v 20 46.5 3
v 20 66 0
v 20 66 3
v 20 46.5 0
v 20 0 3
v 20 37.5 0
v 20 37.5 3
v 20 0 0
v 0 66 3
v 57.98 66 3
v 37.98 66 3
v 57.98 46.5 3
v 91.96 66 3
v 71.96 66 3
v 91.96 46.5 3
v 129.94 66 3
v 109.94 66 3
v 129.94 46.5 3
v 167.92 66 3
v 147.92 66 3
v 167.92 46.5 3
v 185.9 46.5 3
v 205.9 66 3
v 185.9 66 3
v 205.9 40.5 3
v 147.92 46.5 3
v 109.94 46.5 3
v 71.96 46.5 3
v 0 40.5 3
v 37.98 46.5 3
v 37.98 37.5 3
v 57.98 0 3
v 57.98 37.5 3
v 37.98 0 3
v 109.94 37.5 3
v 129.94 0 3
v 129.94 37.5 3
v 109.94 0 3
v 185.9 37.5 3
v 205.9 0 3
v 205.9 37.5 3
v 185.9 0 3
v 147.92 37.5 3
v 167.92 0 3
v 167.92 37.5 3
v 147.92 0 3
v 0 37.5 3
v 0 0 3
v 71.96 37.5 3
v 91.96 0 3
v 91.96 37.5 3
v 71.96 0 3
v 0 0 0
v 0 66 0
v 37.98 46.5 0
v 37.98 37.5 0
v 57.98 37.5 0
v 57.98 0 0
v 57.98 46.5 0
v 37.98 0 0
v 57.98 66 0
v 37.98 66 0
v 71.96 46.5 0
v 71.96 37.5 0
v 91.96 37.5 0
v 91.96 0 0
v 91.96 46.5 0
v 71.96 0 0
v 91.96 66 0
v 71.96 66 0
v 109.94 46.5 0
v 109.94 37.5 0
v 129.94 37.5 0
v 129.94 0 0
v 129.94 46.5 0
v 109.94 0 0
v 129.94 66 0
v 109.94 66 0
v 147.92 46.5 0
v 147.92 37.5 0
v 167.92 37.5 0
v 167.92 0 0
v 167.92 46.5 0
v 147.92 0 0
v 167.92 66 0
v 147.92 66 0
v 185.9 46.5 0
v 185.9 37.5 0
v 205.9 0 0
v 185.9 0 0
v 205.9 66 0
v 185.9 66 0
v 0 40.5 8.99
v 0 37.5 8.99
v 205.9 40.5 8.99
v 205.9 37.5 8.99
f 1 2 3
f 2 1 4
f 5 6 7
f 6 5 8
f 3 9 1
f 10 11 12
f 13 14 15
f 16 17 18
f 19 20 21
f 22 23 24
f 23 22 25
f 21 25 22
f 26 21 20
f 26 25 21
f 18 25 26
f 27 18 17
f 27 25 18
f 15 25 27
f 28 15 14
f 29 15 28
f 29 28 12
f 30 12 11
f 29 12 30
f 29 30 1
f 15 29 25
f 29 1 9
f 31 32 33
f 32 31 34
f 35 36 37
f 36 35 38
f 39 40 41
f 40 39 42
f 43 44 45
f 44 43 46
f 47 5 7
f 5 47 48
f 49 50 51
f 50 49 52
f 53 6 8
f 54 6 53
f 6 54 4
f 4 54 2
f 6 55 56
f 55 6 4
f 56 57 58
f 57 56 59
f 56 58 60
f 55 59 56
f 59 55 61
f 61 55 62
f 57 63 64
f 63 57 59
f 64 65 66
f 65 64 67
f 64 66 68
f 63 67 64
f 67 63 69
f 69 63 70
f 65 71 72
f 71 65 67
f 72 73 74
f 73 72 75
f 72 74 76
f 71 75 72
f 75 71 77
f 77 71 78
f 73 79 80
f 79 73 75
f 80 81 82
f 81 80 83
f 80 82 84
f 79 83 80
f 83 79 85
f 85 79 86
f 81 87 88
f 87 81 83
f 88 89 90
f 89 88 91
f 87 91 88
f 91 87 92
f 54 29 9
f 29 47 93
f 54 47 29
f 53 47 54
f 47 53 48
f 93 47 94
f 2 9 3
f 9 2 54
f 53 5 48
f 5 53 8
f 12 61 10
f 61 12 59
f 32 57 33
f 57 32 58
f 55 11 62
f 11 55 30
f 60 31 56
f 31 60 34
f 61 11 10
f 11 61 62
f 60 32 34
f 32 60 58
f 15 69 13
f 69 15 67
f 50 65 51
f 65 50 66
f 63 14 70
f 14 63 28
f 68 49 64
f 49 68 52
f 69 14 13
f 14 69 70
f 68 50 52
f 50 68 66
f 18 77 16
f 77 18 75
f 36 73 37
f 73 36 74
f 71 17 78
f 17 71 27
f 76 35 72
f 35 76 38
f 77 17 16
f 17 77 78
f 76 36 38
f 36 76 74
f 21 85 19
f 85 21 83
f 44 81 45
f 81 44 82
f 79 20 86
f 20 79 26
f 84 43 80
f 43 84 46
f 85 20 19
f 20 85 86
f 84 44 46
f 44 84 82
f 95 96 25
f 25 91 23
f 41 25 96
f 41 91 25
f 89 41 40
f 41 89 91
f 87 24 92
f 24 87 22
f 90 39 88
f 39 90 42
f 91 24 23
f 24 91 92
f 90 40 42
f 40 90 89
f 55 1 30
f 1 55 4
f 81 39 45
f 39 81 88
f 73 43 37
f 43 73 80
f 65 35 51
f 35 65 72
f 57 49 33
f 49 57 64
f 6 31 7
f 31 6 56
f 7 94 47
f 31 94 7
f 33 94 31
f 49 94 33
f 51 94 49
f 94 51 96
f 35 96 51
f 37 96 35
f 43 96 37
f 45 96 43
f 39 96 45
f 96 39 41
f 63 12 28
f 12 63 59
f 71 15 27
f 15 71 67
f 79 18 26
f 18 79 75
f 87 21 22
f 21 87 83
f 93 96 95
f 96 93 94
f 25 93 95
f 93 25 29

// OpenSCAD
// file: ../lib/block_bridge_chain_with_top_lib.scad
// scad/lib/block_bridge_chain_with_top_lib.scad
// ----------------------------------------------------------------------------
// LIBRARY: Joined blocks with variable-length bridges + optional full-length top
// Units: millimeters (mm)
//
// This library provides the "engine" module that builds the assembly.
// Presets should not call this directly; they should call the part wrapper in
// scad/parts/.
//
// Coordinate system:
// - Origin is the bottom-left-back corner of the FIRST block.
// - +X runs along the chain of blocks.
// - +Y runs "up" within the block footprint in Y.
// - +Z runs upward (thickness/height).
//
// Concepts:
// - Blocks are identical solids placed along +X.
// - Bridges connect block i to block i+1 with per-bridge X-length.
// - A top cap can span the full assembly in X.
// - Bridge Y placement can be min/center/max or numeric Y start.
// ----------------------------------------------------------------------------


// -----------------------------
// Small utilities (pure functions)
// -----------------------------

// Sum of the first n elements of vector v (safe-clamped).
function sum_first(v, n) =
    (n <= 0) ? 0 :
    (n > len(v)) ? sum_first(v, len(v)) :
    v[n-1] + sum_first(v, n-1);

// Clamp scalar v to [lo, hi].
function clamp(v, lo, hi) = (v < lo) ? lo : (v > hi) ? hi : v;

// Convert a "placement spec" into an explicit Y start coordinate.
// Supported:
// - "min"    -> 0
// - "center" -> (container_y - feature_y)/2
// - "max"    -> (container_y - feature_y)
// - number   -> that number (interpreted as a Y start coordinate)
function resolve_y_start(pos, container_y, feature_y) =
    (pos == "min")    ? 0 :
    (pos == "center") ? (container_y - feature_y) / 2 :
    (pos == "max")    ? (container_y - feature_y) :
                        pos;

// X position (origin) of block i (0-based).
// Includes bridge lengths placed before it, and overlap correction.
function block_origin_x(i, block_size_x, bridge_lengths, join_overlap) =
    i * block_size_x
    + sum_first(bridge_lengths, i)
    - (2 * i * join_overlap);

// X position (origin) of bridge j (0-based), between block j and j+1.
function bridge_origin_x(j, block_size_x, bridge_lengths, join_overlap) =
    block_origin_x(j, block_size_x, bridge_lengths, join_overlap) + block_size_x - join_overlap;

// Total X length of the whole assembly.
function assembly_size_x(block_count, block_size_x, bridge_lengths, join_overlap) =
    (block_count * block_size_x)
    + sum_first(bridge_lengths, block_count - 1)
    - (2 * (block_count - 1) * join_overlap);


// -----------------------------
// Primitive solids (modules)
// -----------------------------
module solid_block(size_xyz) {
    cube(size_xyz, center=false);
}

module solid_bridge(len_x, size_y, size_z) {
    cube([len_x, size_y, size_z], center=false);
}


// ----------------------------------------------------------------------------
// Main builder module (engine)
//
// Parameters map closely to your original script.
// ----------------------------------------------------------------------------
module block_bridge_chain_with_top(
    block_count,
    block_size_xyz,          // [X, Y, Z] for each block
    bridge_size_y,           // thickness of bridge in Y
    bridge_size_z,           // thickness of bridge in Z
    bridge_lengths,          // array length = block_count-1
    bridge_y_pos,            // "min" | "center" | "max" | number (Y start)
    join_overlap=0.01,
    add_top_block=false,
    top_size_y=1,            // thickness of top in Y
    top_size_z=1,            // height of top in Z
    clamp_top_y_to_block=true
) {

    // -----------------------------
    // Safety checks (fail early)
    // -----------------------------
    assert(block_count >= 1, "block_count must be >= 1");
    assert(len(bridge_lengths) == max(block_count - 1, 0),
        "bridge_lengths must have exactly block_count-1 entries");

    assert(bridge_size_y > 0, "bridge_size_y must be > 0");
    assert(bridge_size_y <= block_size_xyz[1], "bridge_size_y must be <= block_size_xyz[1]");
    assert(bridge_size_z > 0, "bridge_size_z must be > 0");

    assert(top_size_y > 0, "top_size_y must be > 0");
    assert(top_size_z > 0, "top_size_z must be > 0");

    // -----------------------------
    // Derived values
    // -----------------------------
    block_size_x = block_size_xyz[0];
    block_size_y = block_size_xyz[1];
    block_size_z = block_size_xyz[2];

    // Resolve + clamp bridge Y start so it stays fully inside the block footprint.
    _raw_bridge_y = resolve_y_start(bridge_y_pos, block_size_y, bridge_size_y);
    bridge_y_start = clamp(_raw_bridge_y, 0, block_size_y - bridge_size_y);

    // Full X size of assembly
    assembly_x = assembly_size_x(block_count, block_size_x, bridge_lengths, join_overlap);

    // Top sits on the tallest Z among block vs bridge
    base_z = max(block_size_z, bridge_size_z);

    // Top block sizing + placement
    top_size_xyz = [assembly_x, top_size_y, top_size_z];

    // Align top’s Y start to bridge’s Y start (same “lane”)
    _raw_top_y = bridge_y_start;
    _top_y_clamped = clamp(_raw_top_y, 0, block_size_y - top_size_y);
    top_y_start = clamp_top_y_to_block ? _top_y_clamped : _raw_top_y;

    // Top spans the full assembly: X=0; Z sits at base_z, with tiny overlap for union cleanliness
    top_pos = [0, top_y_start, base_z - join_overlap];

    // -----------------------------
    // Build geometry
    // -----------------------------
    union() {
        // Blocks
        for (i = [0 : block_count - 1]) {
            translate([block_origin_x(i, block_size_x, bridge_lengths, join_overlap), 0, 0])
                solid_block(block_size_xyz);
        }

        // Bridges (only if there are 2+ blocks)
        for (j = [0 : block_count - 2]) {
            translate([bridge_origin_x(j, block_size_x, bridge_lengths, join_overlap), bridge_y_start, 0])
                solid_bridge(bridge_lengths[j], bridge_size_y, bridge_size_z);
        }

        // Optional full-length top block
        if (add_top_block) {
            translate(top_pos)
                solid_block(top_size_xyz);
        }
    }
}
// file: ../parts/block_bridge_chain_with_top_ypos.scad
// scad/parts/block_bridge_chain_with_top_ypos.scad
// ----------------------------------------------------------------------------
// PART: Joined blocks with variable-length bridges + optional full-length top,
// with bridge Y placement control.
// Units: mm
//
// Presets should call: block_bridge_chain_with_top_part(...)
//
// This wrapper exists so presets don’t need to know about library internals.
// ----------------------------------------------------------------------------

use <../lib/block_bridge_chain_with_top_lib.scad>;

// Public part module (stable API for presets)
module block_bridge_chain_with_top_part(
    block_count,
    block_size_xyz,
    bridge_size_y,
    bridge_size_z,
    bridge_lengths,
    bridge_y_pos,
    join_overlap=0.01,
    add_top_block=false,
    top_size_y=1,
    top_size_z=1,
    clamp_top_y_to_block=true
) {
    block_bridge_chain_with_top(
        block_count            = block_count,
        block_size_xyz         = block_size_xyz,
        bridge_size_y          = bridge_size_y,
        bridge_size_z          = bridge_size_z,
        bridge_lengths         = bridge_lengths,
        bridge_y_pos           = bridge_y_pos,
        join_overlap           = join_overlap,
        add_top_block          = add_top_block,
        top_size_y             = top_size_y,
        top_size_z             = top_size_z,
        clamp_top_y_to_block   = clamp_top_y_to_block
    );
}
// main file
// scad/presets/block_bridge_chain_with_top_ypos_example.scad
// ----------------------------------------------------------------------------
// Preset example for the block/bridge chain part.
// Units: mm
// ----------------------------------------------------------------------------

use <../parts/block_bridge_chain_with_top_ypos.scad>;

// -----------------------------
// High-level “design intent” variables
// -----------------------------
STOCK_Z          = 3;     // formerly ELEMENT_THICKNESS
BRIDGE_SIZE_Y    = 9;     // formerly ELEMENT_WIDTH (used as bridge thickness in Y)

// -----------------------------
// Block + bridge definition
// -----------------------------
BLOCK_COUNT      = 6;

// Each block is [X, Y, Z]
BLOCK_SIZE_XYZ   = [20, 66, STOCK_Z];

// Bridge cross-section (Y thickness, Z thickness)
BRIDGE_SIZE_Z    = STOCK_Z;

// Where the bridge starts in Y:
// - "min" | "center" | "max" | numeric Y start
BRIDGE_Y_START   = 37.5;

// Per-bridge X lengths (must be BLOCK_COUNT - 1 entries)
BRIDGE_LENGTHS   = [18, 14, 18, 18, 18];

// Small overlap to ensure clean unions
JOIN_OVERLAP     = 0.01;

// -----------------------------
// Optional top cap
// -----------------------------
ADD_TOP_BLOCK            = true;

// Top block dimensions (X auto computed to span entire assembly)
TOP_SIZE_Y               = 3;

// Your original logic: top Z derived from “bridge width minus thickness”.
// Keep it explicit here so it’s not mysterious.
TOP_SIZE_Z               = BRIDGE_SIZE_Y - STOCK_Z;

// Clamp top Y so it stays within the block footprint (recommended true)
CLAMP_TOP_Y_TO_BLOCK     = true;

// -----------------------------
// Render
// -----------------------------
block_bridge_chain_with_top_part(
    block_count          = BLOCK_COUNT,
    block_size_xyz       = BLOCK_SIZE_XYZ,
    bridge_size_y        = BRIDGE_SIZE_Y,
    bridge_size_z        = BRIDGE_SIZE_Z,
    bridge_lengths       = BRIDGE_LENGTHS,
    bridge_y_pos         = BRIDGE_Y_START,
    join_overlap         = JOIN_OVERLAP,
    add_top_block        = ADD_TOP_BLOCK,
    top_size_y           = TOP_SIZE_Y,
    top_size_z           = TOP_SIZE_Z,
    clamp_top_y_to_block = CLAMP_TOP_Y_TO_BLOCK
);
